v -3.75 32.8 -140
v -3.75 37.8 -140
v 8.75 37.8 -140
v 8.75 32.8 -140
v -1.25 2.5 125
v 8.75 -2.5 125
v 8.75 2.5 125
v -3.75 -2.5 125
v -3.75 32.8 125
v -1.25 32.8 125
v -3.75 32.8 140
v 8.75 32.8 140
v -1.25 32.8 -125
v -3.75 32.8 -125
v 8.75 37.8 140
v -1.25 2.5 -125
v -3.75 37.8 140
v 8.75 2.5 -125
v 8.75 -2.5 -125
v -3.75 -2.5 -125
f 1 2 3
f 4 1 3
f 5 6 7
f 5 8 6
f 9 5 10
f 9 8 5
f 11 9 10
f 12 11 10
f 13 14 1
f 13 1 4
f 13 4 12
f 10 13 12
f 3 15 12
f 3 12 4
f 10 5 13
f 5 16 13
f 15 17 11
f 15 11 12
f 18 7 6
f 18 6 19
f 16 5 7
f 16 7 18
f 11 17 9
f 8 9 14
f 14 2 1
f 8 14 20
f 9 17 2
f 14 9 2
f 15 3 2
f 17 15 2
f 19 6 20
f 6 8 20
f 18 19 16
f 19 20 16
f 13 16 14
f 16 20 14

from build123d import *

# Parameters (mm, degrees)
CROQUIS1_R                   = 2.5
SALIENTE_EXTRUIR1_DEPTH      = 1.25
SALIENTE_EXTRUIR4_DEPTH      = 2.5
CROQUIS6_R                   = 12.525
CORTAR_EXTRUIR3_DEPTH        = 10
SALIENTE_EXTRUIR5_DEPTH      = 200
CROQUIS8_R                   = 12.525
SALIENTE_EXTRUIR6_DEPTH      = 21
CROQUIS10_W                  = 18.5
CROQUIS10_H                  = 25.138120499
CROQUIS10_W_2                = 2.5
CROQUIS10_H_2                = 4.861879501
CROQUIS10_H_3                = 5
CORTAR_EXTRUIR5_DEPTH        = 98
SALIENTE_EXTRUIR7_DEPTH      = 50
SALIENTE_EXTRUIR8_DEPTH      = 15
SALIENTE_EXTRUIR8_DEPTH_BACK = 265
CROQUIS15_W                  = 250
CROQUIS15_H                  = 5
CROQUIS15_W_2                = 280
SALIENTE_EXTRUIR9_DEPTH      = 7.5


with BuildPart() as part:
    # Croquis1 → Saliente-Extruir1 (new, symmetric)
    with BuildSketch(Plane(origin=(0, 0, 0), x_dir=(0, 0, -1), z_dir=(1, 0, 0))):
        with BuildLine():
            Line((125, -2.5), (-125, -2.5))
            Line((-125, -2.5), (-125, 2.5))
            Line((-125, 2.5), (-123, 2.5))
            Line((-123, 2.5), (-117, 17.5))
            ThreePointArc((-117, 17.5), (-110, 24.5), (-103, 17.5))
            Line((-103, 17.5), (-97, 2.5))
            Line((-97, 2.5), (125, 2.5))
            Line((125, 2.5), (125, -2.5))
        make_face()
        with Locations((-110, 17.5)):
            Circle(CROQUIS1_R, mode=Mode.SUBTRACT)
    extrude(amount=SALIENTE_EXTRUIR1_DEPTH, both=True)

    # Croquis5 → Saliente-Extruir4 (add, through all)
    with BuildSketch(Plane(origin=(1.25, 0, 0), x_dir=(0, 0, -1), z_dir=(1, 0, 0))):
        with BuildLine():
            ThreePointArc((-100, 10), (-110, 5), (-120, 10))
            Line((-120, 10), (-121.0552482, 7.361879501))
            ThreePointArc((-121.0552482, 7.361879501), (-110, 2.5), (-98.9447518, 7.361879501))
            Line((-98.9447518, 7.361879501), (-100, 10))
        make_face()
        with BuildLine():
            Line((-121.0552482, 7.361879501), (-120, 10))
            ThreePointArc((-120, 10), (-113.952847075, 29.358541226), (-97.5, 17.5))
            ThreePointArc((-97.5, 17.5), (-98.141458774, 13.547152925), (-100, 10))
            Line((-100, 10), (-98.9447518, 7.361879501))
            ThreePointArc((-98.9447518, 7.361879501), (-96.020931308, 12.060731804), (-95, 17.5))
            ThreePointArc((-95, 17.5), (-115.439268196, 31.479068692), (-121.0552482, 7.361879501))
        make_face()
    extrude(amount=-SALIENTE_EXTRUIR4_DEPTH)

    # Croquis6 → Cortar-Extruir3 (cut)
    with BuildSketch(Plane(origin=(1.25, 0, 0), x_dir=(0, 0, -1), z_dir=(1, 0, 0))):
        with Locations((-110, 17.5)):
            Circle(CROQUIS6_R)
    extrude(amount=-CORTAR_EXTRUIR3_DEPTH, mode=Mode.SUBTRACT)

    # Croquis7 → Saliente-Extruir5 (add)
    with BuildSketch(Plane(origin=(0, 0, -125), x_dir=(-1, 0, 0), z_dir=(0, 0, -1))):
        Polygon((3.75, 37.8), (3.75, -2.5), (1.25, -2.5), (1.25, 2.5), (1.25, 32.8), (-1.25, 32.8), (-1.25, 37.8), align=None)
    extrude(amount=-SALIENTE_EXTRUIR5_DEPTH)

    # Croquis8 → Saliente-Extruir6 (add)
    with BuildSketch(Plane.ZY.offset(1.25)):
        with BuildLine():
            Line((98.9447518, 7.361879501), (97, 2.5))
            Line((97, 2.5), (95, 2.5))
            Line((95, 2.5), (95, -2.5))
            Line((95, -2.5), (125, -2.5))
            Line((125, -2.5), (125, 2.5))
            Line((125, 2.5), (123, 2.5))
            Line((123, 2.5), (121.0552482, 7.361879501))
            ThreePointArc((121.0552482, 7.361879501), (110, 32.5), (98.9447518, 7.361879501))
        make_face()
        with Locations(Location((110, 17.5, 0), (0, 0, 180))):
            Circle(CROQUIS8_R, mode=Mode.SUBTRACT)
    extrude(amount=SALIENTE_EXTRUIR6_DEPTH)

    # Croquis10 → Cortar-Extruir5 (cut)
    with BuildSketch(Plane.XY.offset(75)):
        with Locations((-13, 19.930939751)):
            Rectangle(CROQUIS10_W, CROQUIS10_H)
        Polygon((1.25, 37.8), (-3.75, 37.8), (-3.75, 32.5), (-1.25, 32.5), (-1.25, 32.8), (1.25, 32.8), align=None)
        with Locations((0, 19.930939751)):
            Rectangle(CROQUIS10_W_2, CROQUIS10_H)
        with Locations((-2.5, 19.930939751)):
            Rectangle(CROQUIS10_W_2, CROQUIS10_H)
        with Locations((-13, 4.930939751)):
            Rectangle(CROQUIS10_W, CROQUIS10_H_2)
        with Locations((-2.5, 4.930939751)):
            Rectangle(CROQUIS10_W_2, CROQUIS10_H_2)
        with Locations((0, 4.930939751)):
            Rectangle(CROQUIS10_W_2, CROQUIS10_H_2)
        with Locations((-2.5, 0)):
            Rectangle(CROQUIS10_W_2, CROQUIS10_H_3)
        with Locations((-13, 0)):
            Rectangle(CROQUIS10_W, CROQUIS10_H_3)
        Rectangle(CROQUIS10_W_2, CROQUIS10_H_3)
    extrude(amount=CORTAR_EXTRUIR5_DEPTH, mode=Mode.SUBTRACT)

    # Croquis11 → Saliente-Extruir7 (add)
    with BuildSketch(Plane.XY.offset(75)):
        Polygon((-3.75, 37.8), (-3.75, -2.5), (1.25, -2.5), (1.25, 2.5), (-1.25, 2.5), (-1.25, 32.8), (1.25, 32.8), (1.25, 37.8), align=None)
    extrude(amount=SALIENTE_EXTRUIR7_DEPTH)

    # Croquis14 → Saliente-Extruir8 (add, two sides: drawn at the far end of the back side and taken through both)
    with BuildSketch(Plane.XY.offset(125).offset(-SALIENTE_EXTRUIR8_DEPTH_BACK)):
        Polygon((-1.25, 32.8), (1.25, 32.8), (1.25, 37.8), (-3.75, 37.8), (-3.75, 32.8), align=None)
    extrude(amount=SALIENTE_EXTRUIR8_DEPTH + SALIENTE_EXTRUIR8_DEPTH_BACK)

    # Croquis15 → Saliente-Extruir9 (add)
    with BuildSketch(Plane(origin=(1.25, 0, 0), x_dir=(0, 0, -1), z_dir=(1, 0, 0))):
        Rectangle(CROQUIS15_W, CROQUIS15_H)
        with Locations((0, 35.3)):
            Rectangle(CROQUIS15_W_2, CROQUIS15_H)
    extrude(amount=SALIENTE_EXTRUIR9_DEPTH)


solid = part.part
